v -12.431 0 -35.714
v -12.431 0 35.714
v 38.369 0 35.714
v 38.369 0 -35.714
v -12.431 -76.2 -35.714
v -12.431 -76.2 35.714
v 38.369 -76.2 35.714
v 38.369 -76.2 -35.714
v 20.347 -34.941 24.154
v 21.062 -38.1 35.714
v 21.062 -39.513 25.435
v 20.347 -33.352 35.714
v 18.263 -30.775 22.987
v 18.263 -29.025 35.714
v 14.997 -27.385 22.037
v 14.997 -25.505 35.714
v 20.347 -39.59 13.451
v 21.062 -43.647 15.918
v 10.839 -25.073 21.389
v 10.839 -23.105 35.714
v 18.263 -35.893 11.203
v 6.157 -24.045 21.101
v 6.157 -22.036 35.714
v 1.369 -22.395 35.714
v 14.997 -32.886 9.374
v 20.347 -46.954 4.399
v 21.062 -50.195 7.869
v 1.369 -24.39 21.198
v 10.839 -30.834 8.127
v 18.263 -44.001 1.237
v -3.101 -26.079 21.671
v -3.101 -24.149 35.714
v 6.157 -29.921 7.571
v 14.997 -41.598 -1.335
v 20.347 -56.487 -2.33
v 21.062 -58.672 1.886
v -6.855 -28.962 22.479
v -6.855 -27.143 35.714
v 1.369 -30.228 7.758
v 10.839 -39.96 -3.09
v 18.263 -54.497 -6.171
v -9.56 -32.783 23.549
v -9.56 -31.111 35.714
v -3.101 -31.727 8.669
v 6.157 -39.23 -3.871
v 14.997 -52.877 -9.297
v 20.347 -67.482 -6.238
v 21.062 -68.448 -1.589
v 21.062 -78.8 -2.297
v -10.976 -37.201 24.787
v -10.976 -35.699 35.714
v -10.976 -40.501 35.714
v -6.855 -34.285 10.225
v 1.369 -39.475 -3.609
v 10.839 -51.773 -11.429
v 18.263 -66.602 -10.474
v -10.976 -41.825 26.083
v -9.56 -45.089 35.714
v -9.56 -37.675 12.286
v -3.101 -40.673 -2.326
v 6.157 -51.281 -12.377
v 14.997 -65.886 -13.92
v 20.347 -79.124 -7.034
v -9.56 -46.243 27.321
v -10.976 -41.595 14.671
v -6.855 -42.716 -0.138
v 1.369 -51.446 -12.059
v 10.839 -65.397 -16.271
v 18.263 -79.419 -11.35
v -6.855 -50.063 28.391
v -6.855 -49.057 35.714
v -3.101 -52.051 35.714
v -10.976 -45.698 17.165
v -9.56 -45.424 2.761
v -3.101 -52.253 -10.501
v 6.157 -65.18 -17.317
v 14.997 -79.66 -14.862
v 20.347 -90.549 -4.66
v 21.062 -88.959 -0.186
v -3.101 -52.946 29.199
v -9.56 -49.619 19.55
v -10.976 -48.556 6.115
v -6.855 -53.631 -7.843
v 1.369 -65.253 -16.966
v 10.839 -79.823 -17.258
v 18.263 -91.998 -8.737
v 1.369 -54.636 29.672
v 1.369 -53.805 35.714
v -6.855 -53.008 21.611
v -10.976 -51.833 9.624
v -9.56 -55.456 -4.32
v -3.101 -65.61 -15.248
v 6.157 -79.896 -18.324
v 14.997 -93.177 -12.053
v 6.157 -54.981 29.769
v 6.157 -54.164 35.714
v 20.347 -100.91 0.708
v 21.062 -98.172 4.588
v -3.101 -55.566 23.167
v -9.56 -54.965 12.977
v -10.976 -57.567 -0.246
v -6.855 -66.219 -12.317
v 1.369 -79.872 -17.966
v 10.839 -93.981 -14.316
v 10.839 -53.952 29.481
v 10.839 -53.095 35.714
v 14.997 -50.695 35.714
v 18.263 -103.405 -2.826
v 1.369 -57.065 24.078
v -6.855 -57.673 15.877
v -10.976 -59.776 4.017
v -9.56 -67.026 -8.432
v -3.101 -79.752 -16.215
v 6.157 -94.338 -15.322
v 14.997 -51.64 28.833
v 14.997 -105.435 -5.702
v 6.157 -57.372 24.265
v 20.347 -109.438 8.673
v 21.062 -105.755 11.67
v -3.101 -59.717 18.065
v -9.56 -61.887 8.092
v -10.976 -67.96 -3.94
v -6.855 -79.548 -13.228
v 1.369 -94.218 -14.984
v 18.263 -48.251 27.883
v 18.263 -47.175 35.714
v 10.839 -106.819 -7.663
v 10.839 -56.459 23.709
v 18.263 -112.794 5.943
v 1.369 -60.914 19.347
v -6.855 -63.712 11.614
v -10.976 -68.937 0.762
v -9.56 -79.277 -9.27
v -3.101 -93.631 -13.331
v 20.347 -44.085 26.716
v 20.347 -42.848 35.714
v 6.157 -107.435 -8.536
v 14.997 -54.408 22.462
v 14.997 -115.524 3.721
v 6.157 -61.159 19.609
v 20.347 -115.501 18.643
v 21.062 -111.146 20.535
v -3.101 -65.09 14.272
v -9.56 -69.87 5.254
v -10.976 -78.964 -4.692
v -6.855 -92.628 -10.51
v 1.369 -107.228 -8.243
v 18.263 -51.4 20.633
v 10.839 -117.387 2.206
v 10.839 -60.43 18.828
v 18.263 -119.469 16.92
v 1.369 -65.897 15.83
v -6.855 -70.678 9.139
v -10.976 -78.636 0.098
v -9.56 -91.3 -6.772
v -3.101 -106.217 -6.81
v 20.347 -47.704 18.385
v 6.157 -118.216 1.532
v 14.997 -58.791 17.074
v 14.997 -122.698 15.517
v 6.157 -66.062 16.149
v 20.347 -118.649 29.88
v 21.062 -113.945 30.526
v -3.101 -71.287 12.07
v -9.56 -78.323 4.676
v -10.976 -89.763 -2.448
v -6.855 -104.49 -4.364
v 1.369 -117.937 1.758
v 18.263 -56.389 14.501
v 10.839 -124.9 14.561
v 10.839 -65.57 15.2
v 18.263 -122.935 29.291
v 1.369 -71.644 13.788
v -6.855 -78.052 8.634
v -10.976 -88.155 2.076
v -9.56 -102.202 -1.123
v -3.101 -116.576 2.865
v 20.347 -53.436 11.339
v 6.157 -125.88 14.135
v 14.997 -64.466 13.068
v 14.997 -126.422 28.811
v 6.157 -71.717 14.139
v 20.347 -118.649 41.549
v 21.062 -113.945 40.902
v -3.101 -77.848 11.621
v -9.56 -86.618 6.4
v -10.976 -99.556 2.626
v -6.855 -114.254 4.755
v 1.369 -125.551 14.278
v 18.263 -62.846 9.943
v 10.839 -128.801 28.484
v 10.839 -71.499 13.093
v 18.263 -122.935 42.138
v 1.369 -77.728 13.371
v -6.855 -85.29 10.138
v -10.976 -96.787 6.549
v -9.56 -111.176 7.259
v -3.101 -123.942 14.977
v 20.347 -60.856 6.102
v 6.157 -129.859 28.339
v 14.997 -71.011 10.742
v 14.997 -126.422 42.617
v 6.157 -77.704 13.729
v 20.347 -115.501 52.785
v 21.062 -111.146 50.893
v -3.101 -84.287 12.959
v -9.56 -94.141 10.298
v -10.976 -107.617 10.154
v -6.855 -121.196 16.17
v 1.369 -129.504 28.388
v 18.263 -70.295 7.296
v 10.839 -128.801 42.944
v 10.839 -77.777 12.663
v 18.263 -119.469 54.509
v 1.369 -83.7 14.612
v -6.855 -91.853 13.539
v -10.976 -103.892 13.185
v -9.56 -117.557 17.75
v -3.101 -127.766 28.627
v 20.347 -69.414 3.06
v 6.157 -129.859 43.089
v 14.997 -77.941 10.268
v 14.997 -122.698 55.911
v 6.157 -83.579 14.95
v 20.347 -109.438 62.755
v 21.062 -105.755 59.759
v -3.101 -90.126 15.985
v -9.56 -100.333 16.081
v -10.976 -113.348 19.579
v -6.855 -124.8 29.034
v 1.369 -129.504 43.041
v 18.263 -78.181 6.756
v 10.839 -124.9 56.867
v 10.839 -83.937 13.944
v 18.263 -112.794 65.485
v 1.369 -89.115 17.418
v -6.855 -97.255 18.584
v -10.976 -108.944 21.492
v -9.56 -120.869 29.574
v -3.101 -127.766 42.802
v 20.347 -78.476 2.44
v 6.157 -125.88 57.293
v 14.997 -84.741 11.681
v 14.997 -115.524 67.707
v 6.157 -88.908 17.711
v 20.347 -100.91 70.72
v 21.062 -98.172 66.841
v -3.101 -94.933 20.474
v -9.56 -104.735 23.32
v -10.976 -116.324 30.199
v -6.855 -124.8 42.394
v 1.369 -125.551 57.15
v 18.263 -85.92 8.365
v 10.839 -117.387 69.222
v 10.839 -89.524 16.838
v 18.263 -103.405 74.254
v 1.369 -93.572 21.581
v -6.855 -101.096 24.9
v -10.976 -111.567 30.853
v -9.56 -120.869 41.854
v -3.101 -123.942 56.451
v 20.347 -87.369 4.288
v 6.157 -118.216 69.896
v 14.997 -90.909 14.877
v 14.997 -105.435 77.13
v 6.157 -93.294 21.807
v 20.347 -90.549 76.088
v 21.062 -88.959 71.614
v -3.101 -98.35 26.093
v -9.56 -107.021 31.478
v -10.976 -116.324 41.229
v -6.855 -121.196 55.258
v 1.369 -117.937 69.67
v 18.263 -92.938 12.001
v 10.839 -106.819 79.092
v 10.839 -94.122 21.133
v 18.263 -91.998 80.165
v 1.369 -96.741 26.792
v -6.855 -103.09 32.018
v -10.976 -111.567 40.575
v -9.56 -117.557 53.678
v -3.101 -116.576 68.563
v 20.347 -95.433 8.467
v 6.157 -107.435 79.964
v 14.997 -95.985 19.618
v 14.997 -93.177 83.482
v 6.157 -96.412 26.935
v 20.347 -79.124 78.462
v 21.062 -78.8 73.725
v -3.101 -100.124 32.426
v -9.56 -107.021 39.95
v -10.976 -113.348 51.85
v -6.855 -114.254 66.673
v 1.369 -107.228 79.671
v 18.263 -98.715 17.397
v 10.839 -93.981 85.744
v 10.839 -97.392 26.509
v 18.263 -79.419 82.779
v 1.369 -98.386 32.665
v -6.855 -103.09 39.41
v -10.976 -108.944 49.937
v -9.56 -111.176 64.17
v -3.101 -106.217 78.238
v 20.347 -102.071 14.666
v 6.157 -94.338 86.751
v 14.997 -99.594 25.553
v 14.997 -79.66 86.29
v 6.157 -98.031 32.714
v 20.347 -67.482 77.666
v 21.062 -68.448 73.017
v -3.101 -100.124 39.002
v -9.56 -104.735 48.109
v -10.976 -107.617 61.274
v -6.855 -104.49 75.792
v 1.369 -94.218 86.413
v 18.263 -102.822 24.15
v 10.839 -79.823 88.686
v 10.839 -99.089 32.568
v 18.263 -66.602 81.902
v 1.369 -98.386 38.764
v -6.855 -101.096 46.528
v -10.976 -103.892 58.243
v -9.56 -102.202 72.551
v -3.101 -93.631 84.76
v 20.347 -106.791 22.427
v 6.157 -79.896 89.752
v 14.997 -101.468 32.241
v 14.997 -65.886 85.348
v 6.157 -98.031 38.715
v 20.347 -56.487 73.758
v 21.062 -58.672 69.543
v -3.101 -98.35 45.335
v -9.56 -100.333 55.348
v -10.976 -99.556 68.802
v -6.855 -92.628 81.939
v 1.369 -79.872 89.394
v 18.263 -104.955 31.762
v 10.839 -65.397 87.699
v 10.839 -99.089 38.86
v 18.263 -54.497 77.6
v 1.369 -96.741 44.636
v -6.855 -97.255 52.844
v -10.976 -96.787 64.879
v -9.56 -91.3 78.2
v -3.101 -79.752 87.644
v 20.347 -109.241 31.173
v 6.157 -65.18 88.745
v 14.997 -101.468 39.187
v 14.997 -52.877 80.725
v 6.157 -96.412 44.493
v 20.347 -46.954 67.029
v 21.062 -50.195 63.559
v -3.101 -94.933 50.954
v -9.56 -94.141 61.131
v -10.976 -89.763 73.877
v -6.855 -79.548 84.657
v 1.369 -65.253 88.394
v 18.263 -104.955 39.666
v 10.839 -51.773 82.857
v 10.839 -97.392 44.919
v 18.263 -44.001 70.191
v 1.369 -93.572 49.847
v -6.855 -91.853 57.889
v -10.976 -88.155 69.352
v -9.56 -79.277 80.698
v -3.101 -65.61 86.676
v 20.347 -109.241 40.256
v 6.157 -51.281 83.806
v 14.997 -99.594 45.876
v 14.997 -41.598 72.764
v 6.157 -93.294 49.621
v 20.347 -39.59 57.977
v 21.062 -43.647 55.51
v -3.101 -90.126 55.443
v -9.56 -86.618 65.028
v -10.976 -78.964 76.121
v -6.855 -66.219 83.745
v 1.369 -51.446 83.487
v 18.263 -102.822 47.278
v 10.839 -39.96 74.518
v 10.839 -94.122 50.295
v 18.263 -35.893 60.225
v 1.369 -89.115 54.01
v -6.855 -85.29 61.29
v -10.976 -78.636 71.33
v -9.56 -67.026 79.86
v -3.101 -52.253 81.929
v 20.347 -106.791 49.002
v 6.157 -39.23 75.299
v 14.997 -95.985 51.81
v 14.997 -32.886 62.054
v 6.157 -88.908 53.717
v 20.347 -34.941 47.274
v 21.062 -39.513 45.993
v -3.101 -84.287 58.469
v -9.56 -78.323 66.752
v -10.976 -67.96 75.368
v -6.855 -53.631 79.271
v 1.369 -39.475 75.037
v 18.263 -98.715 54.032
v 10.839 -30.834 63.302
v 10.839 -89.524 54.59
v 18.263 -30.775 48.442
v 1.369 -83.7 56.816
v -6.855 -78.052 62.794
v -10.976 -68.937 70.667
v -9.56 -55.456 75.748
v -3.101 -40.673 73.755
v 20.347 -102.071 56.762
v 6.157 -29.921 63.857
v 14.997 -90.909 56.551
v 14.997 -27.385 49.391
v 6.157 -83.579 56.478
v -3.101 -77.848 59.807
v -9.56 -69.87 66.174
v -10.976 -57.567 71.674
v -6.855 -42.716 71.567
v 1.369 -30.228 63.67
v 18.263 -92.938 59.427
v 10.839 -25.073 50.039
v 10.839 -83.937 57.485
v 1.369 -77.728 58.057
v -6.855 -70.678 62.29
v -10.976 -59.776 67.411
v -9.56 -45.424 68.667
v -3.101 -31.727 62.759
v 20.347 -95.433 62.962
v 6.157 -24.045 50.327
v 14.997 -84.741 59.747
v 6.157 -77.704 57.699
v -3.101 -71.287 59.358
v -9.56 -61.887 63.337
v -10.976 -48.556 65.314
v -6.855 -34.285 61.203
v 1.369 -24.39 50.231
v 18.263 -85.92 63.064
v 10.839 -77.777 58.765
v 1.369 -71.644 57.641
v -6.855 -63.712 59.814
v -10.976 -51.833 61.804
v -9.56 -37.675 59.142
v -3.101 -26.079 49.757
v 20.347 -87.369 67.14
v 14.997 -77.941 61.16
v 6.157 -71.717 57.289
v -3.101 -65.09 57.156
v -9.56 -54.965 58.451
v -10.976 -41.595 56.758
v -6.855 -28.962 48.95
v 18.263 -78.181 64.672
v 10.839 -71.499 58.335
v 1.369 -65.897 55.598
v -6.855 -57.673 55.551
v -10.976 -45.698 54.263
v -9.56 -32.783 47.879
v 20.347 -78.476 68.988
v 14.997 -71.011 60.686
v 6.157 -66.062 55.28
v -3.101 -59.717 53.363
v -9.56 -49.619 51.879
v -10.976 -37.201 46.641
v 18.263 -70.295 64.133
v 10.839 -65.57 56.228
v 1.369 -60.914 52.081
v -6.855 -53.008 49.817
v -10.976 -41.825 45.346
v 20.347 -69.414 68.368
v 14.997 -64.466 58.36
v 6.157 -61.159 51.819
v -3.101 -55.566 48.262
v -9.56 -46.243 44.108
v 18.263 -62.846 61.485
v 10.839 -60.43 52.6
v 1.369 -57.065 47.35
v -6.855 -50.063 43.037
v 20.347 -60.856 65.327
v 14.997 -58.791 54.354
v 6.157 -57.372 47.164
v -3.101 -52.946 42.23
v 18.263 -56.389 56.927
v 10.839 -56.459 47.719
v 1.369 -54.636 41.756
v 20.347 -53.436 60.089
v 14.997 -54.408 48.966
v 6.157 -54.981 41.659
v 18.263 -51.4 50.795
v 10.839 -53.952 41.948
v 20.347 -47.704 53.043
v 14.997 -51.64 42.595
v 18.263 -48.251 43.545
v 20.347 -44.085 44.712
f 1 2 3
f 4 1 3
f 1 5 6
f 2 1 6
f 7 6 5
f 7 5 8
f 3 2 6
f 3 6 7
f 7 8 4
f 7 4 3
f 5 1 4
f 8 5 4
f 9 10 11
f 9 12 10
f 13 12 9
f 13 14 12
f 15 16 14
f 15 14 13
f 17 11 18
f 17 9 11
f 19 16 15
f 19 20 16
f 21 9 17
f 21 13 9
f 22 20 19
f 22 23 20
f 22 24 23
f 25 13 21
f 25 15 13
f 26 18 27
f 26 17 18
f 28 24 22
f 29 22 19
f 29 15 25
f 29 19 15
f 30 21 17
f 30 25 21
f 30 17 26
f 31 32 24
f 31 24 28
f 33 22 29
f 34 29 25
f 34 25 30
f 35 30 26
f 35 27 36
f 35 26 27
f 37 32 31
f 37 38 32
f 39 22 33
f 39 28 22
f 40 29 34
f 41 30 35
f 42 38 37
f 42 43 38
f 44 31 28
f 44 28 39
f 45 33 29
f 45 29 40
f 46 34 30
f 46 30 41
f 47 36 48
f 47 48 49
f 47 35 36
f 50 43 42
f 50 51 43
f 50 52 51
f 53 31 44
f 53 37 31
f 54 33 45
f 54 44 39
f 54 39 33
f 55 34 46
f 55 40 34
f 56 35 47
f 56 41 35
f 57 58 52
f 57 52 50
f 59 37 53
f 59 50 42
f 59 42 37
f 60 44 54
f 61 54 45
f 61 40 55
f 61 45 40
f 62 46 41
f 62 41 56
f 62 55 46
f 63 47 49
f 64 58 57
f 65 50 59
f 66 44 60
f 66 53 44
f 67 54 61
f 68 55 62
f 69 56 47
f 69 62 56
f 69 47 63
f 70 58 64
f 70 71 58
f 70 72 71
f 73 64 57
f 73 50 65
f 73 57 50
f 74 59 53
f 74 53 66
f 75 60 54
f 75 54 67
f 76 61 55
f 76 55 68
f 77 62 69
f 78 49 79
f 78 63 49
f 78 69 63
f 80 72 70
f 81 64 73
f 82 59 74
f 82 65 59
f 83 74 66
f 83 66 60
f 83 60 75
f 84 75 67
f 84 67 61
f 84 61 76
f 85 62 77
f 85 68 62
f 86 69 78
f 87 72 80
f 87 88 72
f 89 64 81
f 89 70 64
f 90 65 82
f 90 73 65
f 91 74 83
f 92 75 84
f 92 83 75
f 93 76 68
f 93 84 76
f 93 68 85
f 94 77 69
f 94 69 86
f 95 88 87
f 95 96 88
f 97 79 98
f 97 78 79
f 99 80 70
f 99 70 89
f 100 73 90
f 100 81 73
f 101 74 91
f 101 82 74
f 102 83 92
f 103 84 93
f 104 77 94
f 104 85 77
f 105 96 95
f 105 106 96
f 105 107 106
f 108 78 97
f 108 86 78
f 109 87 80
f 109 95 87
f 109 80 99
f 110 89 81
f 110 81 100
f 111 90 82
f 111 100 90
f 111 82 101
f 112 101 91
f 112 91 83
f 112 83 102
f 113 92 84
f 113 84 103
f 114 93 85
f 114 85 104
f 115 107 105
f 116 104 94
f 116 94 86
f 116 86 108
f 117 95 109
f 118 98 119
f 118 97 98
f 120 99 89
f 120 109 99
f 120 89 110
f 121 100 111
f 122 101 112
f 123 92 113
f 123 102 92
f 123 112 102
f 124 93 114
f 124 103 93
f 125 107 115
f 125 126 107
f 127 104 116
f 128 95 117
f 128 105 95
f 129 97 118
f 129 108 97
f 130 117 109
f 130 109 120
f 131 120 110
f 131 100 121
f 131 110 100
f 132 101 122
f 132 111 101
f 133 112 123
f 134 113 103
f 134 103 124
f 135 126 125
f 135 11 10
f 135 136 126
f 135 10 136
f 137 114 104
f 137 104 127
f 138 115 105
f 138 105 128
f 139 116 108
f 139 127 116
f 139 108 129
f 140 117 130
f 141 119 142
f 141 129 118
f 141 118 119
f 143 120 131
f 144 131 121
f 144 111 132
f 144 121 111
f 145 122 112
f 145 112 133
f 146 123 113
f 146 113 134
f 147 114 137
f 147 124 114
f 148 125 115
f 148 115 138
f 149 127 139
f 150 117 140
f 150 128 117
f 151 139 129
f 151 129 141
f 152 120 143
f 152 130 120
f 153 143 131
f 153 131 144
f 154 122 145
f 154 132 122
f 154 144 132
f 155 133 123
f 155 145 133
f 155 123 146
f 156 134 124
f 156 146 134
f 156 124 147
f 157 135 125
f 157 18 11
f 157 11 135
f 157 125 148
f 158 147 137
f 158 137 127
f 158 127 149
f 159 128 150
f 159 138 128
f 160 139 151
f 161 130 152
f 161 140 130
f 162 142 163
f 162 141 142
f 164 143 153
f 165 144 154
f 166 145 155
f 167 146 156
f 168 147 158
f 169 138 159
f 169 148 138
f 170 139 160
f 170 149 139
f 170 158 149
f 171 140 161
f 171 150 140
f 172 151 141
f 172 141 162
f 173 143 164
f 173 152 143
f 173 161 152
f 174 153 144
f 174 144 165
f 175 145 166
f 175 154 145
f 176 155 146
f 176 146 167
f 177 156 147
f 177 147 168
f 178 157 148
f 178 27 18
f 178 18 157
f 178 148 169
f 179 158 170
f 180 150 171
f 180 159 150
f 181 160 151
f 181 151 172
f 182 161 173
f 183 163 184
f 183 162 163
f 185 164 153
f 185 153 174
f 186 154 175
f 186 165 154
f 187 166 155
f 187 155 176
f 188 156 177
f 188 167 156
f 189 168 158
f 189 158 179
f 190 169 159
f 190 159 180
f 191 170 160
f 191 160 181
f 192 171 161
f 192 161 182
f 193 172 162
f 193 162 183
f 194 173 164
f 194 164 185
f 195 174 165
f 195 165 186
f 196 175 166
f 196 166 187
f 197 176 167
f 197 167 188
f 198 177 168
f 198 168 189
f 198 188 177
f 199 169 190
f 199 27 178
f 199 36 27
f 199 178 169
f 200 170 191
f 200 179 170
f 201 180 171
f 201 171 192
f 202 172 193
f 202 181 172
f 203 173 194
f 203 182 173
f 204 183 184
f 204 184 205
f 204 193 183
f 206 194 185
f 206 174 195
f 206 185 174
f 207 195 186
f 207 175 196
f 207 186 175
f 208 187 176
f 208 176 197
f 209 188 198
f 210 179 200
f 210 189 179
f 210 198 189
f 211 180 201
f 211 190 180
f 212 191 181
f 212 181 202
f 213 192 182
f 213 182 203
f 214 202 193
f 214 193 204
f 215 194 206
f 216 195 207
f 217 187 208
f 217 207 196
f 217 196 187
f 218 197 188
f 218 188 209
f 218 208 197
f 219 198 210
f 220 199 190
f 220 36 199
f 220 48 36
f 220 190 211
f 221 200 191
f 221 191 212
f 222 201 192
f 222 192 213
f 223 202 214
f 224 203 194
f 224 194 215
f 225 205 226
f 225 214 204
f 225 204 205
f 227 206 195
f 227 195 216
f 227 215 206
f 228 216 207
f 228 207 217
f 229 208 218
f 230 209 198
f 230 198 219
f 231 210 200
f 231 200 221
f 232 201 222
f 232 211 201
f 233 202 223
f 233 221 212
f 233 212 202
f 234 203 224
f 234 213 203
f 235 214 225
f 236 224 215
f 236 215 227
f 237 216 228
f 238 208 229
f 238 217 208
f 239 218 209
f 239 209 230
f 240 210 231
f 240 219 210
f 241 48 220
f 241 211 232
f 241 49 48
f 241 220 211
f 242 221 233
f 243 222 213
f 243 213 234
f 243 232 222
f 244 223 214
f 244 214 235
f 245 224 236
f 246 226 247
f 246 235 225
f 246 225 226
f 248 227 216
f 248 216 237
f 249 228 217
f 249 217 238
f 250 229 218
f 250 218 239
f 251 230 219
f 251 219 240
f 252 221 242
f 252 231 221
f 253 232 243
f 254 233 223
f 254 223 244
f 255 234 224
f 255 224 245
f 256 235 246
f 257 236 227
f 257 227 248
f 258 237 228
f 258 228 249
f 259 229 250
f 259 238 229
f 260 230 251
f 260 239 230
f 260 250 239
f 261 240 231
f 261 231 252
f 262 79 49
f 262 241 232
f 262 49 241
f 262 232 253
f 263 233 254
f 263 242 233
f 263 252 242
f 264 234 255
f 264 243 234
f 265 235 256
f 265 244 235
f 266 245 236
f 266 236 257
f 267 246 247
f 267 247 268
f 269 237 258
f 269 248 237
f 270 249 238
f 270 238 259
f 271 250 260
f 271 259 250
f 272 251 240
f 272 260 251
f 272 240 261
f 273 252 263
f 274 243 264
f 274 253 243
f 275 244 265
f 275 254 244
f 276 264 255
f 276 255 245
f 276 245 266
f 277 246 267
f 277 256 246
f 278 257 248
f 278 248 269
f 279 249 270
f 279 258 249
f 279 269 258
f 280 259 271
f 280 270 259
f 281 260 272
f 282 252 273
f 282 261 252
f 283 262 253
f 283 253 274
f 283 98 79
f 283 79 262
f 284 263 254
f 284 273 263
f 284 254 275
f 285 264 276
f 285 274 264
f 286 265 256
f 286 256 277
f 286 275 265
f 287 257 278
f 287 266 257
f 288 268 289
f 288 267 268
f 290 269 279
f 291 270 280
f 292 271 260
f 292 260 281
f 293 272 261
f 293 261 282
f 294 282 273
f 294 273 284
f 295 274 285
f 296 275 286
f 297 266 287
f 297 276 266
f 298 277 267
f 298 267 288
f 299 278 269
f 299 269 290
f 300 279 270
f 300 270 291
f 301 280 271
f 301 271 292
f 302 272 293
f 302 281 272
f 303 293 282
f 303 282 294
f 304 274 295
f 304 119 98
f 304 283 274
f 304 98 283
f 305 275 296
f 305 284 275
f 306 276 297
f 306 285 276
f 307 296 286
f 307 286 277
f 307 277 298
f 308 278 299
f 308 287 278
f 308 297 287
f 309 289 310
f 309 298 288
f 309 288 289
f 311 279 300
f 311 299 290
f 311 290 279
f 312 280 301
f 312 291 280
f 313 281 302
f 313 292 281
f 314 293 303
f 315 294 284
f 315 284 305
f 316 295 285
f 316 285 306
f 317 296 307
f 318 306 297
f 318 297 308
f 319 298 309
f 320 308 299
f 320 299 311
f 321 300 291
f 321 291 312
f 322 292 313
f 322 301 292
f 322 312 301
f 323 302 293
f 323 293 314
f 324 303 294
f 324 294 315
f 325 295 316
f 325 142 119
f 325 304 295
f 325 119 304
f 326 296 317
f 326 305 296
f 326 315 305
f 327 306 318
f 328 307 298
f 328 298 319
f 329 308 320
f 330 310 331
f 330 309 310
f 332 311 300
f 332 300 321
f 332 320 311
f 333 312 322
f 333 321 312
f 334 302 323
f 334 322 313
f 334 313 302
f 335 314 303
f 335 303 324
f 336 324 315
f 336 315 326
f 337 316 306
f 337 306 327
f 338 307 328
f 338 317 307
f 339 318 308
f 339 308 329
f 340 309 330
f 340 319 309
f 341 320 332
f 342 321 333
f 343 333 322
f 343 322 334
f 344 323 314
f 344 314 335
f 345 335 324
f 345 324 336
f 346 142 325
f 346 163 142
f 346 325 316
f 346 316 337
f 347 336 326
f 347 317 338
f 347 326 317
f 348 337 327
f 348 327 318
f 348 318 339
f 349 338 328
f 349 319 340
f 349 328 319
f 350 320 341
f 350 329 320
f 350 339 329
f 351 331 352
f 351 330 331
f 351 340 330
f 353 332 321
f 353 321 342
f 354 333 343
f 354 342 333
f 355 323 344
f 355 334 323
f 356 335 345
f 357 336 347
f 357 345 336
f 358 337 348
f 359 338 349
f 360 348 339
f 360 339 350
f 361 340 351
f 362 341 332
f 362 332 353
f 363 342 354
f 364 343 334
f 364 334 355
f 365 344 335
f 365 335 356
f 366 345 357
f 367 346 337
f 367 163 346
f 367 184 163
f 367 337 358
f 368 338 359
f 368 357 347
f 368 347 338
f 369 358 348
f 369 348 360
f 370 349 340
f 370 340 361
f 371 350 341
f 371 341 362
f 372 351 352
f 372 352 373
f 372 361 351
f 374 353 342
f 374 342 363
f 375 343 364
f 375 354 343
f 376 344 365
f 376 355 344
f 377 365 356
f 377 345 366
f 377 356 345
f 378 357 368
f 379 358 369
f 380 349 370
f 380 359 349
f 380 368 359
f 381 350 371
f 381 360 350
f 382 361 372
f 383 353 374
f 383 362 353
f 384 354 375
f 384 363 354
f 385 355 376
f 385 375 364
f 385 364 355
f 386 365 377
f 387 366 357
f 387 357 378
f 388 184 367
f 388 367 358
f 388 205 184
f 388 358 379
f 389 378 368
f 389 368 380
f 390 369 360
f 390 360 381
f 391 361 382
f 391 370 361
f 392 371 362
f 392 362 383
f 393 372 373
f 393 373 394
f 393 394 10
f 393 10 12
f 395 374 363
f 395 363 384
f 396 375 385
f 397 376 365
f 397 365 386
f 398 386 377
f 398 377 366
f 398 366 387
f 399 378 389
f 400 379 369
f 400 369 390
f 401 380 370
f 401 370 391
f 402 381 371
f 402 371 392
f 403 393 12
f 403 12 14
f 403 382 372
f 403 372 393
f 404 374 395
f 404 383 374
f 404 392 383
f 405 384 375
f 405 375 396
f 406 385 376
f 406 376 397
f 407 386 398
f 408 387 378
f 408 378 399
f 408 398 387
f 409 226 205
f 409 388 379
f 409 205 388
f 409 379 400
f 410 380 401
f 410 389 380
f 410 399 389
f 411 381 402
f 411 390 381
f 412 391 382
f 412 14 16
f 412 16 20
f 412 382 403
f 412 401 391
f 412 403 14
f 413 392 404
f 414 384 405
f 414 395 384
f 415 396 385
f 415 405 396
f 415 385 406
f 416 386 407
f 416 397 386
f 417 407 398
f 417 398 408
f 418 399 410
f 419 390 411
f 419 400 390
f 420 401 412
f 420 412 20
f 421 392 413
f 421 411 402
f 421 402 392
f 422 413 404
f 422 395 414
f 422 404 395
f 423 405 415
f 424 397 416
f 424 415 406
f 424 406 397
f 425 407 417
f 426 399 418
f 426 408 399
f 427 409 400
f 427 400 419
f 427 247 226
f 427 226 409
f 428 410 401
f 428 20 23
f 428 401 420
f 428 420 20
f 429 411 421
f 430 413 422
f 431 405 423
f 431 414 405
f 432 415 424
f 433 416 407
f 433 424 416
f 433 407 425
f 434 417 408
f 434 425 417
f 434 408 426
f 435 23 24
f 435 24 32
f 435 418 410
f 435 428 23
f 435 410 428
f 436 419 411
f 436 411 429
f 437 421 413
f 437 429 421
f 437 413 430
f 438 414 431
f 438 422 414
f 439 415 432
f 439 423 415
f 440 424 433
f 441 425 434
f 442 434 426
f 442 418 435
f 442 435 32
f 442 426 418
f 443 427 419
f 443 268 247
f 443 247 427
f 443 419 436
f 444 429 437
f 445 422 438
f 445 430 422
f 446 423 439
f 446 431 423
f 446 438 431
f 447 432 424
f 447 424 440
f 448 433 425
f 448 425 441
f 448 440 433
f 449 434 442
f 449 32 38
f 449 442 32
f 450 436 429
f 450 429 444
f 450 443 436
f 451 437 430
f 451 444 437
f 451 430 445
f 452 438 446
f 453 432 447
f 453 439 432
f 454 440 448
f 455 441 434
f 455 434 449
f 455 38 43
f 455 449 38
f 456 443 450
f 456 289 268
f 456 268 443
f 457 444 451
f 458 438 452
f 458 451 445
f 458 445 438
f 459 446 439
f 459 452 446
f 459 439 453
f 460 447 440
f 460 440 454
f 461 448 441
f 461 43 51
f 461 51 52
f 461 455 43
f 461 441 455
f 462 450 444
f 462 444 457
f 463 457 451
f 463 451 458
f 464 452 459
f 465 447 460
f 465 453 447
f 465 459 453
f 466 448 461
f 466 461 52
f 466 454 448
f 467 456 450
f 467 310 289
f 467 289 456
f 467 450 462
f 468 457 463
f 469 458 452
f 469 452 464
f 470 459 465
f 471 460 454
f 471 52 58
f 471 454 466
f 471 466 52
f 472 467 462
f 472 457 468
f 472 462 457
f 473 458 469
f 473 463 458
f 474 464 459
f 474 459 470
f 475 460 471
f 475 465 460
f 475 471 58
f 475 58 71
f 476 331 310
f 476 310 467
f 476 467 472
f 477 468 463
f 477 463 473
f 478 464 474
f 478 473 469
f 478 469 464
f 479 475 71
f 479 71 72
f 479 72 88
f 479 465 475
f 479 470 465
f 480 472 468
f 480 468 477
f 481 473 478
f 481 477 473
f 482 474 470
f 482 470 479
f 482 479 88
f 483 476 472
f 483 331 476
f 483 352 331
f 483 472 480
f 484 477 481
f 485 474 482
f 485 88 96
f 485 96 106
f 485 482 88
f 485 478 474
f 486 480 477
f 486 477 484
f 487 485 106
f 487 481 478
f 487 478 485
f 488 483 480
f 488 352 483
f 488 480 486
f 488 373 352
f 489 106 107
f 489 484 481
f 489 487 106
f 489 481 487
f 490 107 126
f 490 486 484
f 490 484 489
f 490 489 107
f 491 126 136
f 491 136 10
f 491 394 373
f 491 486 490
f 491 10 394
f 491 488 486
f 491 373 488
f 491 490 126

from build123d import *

# Parameters (mm, degrees)
F0_W     = 50.8
F0_H     = 71.4282666582
F1_DEPTH = 76.2
F2_R     = 16.1090010983


with BuildPart() as f1:
    # F0 (on Front) → F1 (new body)
    with BuildSketch(Plane.XZ):
        with Locations((12.9694777326, 0)):
            Rectangle(F0_W, F0_H)
    extrude(amount=F1_DEPTH)


with BuildPart() as f3:
    # F2 (on face) → F3 (revolve)
    with BuildSketch(Plane.XY.offset(35.7141333291)):
        with Locations((4.9534030259, -38.1)):
            Circle(F2_R)
    revolve(axis=Axis((12.9694777326, -76.2, 35.7141333291), (-1, 0, 0)))


solid = Compound([f1.part, f3.part])
